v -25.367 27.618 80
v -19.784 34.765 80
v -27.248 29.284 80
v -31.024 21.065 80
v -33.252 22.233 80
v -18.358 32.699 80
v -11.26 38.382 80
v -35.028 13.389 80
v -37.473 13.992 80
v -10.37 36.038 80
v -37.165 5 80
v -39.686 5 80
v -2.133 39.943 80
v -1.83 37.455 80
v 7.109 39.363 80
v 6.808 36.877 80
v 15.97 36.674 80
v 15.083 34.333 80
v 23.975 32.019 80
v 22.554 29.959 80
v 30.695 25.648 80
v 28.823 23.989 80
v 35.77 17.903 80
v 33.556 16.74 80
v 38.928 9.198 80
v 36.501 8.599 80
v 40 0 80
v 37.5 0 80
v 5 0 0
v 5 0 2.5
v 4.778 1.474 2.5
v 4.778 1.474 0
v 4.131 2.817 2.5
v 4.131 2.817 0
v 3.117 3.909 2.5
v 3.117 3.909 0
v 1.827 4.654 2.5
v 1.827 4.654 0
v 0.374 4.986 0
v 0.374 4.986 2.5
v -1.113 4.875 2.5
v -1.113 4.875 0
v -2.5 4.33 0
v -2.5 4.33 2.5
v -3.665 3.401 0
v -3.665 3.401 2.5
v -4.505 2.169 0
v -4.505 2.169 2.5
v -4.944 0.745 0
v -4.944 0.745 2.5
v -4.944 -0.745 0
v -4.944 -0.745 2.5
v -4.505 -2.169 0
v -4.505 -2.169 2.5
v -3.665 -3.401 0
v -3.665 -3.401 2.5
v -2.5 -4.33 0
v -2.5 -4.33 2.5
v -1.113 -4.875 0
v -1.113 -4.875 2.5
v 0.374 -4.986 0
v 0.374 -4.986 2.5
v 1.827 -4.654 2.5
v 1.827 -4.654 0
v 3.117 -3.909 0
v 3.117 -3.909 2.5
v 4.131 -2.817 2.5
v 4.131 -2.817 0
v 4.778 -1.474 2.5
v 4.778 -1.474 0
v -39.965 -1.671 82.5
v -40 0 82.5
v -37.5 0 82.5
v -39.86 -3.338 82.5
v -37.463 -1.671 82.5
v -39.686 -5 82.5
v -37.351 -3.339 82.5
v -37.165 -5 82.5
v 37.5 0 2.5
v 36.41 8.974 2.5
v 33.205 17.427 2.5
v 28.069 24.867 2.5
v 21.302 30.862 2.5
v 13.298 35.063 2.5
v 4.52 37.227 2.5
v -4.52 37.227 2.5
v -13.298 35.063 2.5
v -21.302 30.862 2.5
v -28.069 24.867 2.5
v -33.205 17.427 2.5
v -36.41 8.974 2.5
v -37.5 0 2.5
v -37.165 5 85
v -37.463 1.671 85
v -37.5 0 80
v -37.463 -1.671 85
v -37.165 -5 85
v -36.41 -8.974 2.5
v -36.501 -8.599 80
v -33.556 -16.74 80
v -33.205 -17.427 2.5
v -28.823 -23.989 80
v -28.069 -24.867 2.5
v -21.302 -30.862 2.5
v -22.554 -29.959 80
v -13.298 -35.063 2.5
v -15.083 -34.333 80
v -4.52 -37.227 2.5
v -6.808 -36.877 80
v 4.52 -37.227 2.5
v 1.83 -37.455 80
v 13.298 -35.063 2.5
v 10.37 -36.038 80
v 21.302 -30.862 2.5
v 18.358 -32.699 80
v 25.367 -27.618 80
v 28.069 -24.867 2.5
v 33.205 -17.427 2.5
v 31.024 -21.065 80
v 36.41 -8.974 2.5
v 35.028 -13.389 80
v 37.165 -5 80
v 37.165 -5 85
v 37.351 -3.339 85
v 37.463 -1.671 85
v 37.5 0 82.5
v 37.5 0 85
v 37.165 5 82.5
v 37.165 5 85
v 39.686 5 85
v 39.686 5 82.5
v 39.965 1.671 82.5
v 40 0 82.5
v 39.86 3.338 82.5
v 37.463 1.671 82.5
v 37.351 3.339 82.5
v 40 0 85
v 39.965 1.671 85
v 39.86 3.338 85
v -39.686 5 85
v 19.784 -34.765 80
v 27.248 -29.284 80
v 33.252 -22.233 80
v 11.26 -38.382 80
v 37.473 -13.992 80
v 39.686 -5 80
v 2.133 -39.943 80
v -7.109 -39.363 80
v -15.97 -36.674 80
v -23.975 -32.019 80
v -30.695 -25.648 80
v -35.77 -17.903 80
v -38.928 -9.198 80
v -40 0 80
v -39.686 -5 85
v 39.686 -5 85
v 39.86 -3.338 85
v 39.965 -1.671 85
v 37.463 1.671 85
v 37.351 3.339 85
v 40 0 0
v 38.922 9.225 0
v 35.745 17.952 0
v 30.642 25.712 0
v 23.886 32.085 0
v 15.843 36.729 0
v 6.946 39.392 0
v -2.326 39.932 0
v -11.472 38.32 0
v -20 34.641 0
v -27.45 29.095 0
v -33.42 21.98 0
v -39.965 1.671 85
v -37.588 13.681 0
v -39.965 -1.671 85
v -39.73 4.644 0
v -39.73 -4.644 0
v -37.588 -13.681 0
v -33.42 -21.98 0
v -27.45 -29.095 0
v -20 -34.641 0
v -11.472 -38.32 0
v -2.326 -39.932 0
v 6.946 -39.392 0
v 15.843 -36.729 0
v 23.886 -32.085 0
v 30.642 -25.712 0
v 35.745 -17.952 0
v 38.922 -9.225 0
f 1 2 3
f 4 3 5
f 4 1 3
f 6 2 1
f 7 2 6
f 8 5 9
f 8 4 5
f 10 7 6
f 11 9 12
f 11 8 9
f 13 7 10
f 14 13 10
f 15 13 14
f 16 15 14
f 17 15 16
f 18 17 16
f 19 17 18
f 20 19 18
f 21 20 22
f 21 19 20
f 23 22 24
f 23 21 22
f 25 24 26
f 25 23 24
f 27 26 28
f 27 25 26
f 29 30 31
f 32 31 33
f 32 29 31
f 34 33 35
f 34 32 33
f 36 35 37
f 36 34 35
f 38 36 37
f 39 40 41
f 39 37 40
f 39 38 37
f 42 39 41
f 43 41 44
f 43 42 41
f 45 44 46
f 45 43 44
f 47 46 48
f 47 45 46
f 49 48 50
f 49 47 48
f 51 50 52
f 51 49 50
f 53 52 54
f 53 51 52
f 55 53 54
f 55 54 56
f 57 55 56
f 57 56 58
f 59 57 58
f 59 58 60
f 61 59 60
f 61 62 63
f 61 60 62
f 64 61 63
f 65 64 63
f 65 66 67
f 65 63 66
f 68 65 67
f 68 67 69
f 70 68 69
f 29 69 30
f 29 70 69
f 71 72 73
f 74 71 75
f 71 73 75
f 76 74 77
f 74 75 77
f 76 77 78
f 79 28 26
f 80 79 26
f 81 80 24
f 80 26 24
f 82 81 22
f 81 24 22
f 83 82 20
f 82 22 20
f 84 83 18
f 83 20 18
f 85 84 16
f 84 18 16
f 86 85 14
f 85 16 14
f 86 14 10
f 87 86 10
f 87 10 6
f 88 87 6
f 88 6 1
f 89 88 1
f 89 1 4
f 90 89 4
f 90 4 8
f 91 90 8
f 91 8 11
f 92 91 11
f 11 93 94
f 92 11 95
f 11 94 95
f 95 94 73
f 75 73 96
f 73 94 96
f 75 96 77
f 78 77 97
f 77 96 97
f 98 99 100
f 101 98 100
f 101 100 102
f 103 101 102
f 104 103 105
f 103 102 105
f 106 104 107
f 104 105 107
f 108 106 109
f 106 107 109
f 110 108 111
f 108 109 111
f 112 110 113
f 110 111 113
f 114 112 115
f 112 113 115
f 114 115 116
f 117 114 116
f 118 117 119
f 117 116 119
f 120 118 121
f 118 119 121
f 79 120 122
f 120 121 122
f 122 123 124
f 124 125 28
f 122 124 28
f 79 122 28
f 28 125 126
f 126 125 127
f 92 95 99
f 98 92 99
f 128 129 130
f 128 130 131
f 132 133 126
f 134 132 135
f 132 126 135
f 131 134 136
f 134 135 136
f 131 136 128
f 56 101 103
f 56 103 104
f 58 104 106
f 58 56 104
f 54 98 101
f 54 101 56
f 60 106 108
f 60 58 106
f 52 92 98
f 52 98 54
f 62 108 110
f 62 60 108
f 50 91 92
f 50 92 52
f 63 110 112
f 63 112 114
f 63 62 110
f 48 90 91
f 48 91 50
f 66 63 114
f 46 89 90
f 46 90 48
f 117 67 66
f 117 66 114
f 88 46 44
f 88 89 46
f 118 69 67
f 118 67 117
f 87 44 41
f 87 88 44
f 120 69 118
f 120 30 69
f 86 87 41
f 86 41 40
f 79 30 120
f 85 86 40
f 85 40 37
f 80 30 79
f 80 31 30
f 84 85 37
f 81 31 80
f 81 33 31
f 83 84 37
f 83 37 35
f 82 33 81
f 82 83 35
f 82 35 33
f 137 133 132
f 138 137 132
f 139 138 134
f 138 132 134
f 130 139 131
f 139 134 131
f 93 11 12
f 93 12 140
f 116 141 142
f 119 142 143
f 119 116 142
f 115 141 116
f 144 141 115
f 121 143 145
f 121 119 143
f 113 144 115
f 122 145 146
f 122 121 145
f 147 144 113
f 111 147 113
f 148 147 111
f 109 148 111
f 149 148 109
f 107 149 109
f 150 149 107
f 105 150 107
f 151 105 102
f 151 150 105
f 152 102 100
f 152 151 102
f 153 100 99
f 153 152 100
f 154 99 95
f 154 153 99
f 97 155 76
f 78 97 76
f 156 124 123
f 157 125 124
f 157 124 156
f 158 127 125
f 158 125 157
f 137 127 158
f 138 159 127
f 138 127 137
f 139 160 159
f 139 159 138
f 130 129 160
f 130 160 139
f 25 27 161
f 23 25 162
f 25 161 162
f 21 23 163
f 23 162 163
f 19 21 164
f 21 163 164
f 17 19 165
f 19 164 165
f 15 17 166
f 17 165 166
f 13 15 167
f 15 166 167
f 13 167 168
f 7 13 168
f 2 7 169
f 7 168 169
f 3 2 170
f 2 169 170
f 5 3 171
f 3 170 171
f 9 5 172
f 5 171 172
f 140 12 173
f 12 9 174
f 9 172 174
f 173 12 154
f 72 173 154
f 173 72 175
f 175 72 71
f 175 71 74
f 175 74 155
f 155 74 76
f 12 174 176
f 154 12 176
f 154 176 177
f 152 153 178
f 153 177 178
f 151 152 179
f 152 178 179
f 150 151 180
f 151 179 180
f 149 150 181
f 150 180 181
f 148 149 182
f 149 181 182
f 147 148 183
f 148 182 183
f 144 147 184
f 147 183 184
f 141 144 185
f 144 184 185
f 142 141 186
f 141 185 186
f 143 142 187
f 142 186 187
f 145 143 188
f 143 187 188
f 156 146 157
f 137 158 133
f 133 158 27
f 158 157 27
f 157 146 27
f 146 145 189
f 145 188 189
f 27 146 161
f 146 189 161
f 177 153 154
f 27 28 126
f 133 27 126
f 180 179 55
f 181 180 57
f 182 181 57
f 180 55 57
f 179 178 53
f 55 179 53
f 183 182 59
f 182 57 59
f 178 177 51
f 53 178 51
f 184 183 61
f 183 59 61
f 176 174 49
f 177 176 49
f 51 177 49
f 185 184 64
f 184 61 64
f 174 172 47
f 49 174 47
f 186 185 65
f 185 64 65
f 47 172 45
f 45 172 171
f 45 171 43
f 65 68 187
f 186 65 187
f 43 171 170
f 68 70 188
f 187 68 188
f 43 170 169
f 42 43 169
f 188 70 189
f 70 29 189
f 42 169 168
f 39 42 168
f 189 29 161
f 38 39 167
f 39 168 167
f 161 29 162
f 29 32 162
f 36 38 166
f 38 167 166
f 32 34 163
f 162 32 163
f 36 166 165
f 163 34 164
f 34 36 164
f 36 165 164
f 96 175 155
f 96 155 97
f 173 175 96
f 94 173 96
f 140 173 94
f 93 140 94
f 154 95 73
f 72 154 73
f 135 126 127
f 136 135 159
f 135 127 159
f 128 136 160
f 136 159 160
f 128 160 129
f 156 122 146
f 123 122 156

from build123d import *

# Parameters (mm, degrees)
F0_R     = 40
F0_R_2   = 5
F1_DEPTH = 85
F3_R     = 37.5
F4_DEPTH = 82.5
F5_W     = 5
F5_H     = 2.5
F5_W_2   = 35
F5_H_2   = 5
F6_DEPTH = 50
F8_COUNT = 2


with BuildPart() as f1:
    # F0 (on Top) → F1 (new body)
    with BuildSketch(Plane.XY):
        Circle(F0_R)
        Circle(F0_R_2, mode=Mode.SUBTRACT)
    extrude(amount=F1_DEPTH)

    # F3 (on face) → F4 (cut)
    with BuildSketch(Plane.XY.offset(85)):
        Circle(F3_R)
    extrude(amount=-F4_DEPTH, mode=Mode.SUBTRACT)


with BuildPart() as f6:
    # F5 (on Right) → F6 (new body)
    with BuildSketch(Plane.YZ):
        Polygon((5, 82.5), (5, 80), (40, 80), (40, 85), (5, 85), align=None)
        with Locations((2.5, 81.25)):
            Rectangle(F5_W, F5_H)
        with Locations((-22.5, 82.5)):
            Rectangle(F5_W_2, F5_H_2)
    extrude(amount=F6_DEPTH)


with BuildPart() as f8_1:
    # F8: instance of F6
    add(f6.part.rotate(Axis((0, 0, 42.584691), (0, 0, 1)), 1 * 360 / F8_COUNT))


with BuildPart() as f1_1:
    add(f1.part)

    # F9: cut F6, F8_1
    add(f6.part, mode=Mode.SUBTRACT)
    add(f8_1.part, mode=Mode.SUBTRACT)


solid = f1_1.part
